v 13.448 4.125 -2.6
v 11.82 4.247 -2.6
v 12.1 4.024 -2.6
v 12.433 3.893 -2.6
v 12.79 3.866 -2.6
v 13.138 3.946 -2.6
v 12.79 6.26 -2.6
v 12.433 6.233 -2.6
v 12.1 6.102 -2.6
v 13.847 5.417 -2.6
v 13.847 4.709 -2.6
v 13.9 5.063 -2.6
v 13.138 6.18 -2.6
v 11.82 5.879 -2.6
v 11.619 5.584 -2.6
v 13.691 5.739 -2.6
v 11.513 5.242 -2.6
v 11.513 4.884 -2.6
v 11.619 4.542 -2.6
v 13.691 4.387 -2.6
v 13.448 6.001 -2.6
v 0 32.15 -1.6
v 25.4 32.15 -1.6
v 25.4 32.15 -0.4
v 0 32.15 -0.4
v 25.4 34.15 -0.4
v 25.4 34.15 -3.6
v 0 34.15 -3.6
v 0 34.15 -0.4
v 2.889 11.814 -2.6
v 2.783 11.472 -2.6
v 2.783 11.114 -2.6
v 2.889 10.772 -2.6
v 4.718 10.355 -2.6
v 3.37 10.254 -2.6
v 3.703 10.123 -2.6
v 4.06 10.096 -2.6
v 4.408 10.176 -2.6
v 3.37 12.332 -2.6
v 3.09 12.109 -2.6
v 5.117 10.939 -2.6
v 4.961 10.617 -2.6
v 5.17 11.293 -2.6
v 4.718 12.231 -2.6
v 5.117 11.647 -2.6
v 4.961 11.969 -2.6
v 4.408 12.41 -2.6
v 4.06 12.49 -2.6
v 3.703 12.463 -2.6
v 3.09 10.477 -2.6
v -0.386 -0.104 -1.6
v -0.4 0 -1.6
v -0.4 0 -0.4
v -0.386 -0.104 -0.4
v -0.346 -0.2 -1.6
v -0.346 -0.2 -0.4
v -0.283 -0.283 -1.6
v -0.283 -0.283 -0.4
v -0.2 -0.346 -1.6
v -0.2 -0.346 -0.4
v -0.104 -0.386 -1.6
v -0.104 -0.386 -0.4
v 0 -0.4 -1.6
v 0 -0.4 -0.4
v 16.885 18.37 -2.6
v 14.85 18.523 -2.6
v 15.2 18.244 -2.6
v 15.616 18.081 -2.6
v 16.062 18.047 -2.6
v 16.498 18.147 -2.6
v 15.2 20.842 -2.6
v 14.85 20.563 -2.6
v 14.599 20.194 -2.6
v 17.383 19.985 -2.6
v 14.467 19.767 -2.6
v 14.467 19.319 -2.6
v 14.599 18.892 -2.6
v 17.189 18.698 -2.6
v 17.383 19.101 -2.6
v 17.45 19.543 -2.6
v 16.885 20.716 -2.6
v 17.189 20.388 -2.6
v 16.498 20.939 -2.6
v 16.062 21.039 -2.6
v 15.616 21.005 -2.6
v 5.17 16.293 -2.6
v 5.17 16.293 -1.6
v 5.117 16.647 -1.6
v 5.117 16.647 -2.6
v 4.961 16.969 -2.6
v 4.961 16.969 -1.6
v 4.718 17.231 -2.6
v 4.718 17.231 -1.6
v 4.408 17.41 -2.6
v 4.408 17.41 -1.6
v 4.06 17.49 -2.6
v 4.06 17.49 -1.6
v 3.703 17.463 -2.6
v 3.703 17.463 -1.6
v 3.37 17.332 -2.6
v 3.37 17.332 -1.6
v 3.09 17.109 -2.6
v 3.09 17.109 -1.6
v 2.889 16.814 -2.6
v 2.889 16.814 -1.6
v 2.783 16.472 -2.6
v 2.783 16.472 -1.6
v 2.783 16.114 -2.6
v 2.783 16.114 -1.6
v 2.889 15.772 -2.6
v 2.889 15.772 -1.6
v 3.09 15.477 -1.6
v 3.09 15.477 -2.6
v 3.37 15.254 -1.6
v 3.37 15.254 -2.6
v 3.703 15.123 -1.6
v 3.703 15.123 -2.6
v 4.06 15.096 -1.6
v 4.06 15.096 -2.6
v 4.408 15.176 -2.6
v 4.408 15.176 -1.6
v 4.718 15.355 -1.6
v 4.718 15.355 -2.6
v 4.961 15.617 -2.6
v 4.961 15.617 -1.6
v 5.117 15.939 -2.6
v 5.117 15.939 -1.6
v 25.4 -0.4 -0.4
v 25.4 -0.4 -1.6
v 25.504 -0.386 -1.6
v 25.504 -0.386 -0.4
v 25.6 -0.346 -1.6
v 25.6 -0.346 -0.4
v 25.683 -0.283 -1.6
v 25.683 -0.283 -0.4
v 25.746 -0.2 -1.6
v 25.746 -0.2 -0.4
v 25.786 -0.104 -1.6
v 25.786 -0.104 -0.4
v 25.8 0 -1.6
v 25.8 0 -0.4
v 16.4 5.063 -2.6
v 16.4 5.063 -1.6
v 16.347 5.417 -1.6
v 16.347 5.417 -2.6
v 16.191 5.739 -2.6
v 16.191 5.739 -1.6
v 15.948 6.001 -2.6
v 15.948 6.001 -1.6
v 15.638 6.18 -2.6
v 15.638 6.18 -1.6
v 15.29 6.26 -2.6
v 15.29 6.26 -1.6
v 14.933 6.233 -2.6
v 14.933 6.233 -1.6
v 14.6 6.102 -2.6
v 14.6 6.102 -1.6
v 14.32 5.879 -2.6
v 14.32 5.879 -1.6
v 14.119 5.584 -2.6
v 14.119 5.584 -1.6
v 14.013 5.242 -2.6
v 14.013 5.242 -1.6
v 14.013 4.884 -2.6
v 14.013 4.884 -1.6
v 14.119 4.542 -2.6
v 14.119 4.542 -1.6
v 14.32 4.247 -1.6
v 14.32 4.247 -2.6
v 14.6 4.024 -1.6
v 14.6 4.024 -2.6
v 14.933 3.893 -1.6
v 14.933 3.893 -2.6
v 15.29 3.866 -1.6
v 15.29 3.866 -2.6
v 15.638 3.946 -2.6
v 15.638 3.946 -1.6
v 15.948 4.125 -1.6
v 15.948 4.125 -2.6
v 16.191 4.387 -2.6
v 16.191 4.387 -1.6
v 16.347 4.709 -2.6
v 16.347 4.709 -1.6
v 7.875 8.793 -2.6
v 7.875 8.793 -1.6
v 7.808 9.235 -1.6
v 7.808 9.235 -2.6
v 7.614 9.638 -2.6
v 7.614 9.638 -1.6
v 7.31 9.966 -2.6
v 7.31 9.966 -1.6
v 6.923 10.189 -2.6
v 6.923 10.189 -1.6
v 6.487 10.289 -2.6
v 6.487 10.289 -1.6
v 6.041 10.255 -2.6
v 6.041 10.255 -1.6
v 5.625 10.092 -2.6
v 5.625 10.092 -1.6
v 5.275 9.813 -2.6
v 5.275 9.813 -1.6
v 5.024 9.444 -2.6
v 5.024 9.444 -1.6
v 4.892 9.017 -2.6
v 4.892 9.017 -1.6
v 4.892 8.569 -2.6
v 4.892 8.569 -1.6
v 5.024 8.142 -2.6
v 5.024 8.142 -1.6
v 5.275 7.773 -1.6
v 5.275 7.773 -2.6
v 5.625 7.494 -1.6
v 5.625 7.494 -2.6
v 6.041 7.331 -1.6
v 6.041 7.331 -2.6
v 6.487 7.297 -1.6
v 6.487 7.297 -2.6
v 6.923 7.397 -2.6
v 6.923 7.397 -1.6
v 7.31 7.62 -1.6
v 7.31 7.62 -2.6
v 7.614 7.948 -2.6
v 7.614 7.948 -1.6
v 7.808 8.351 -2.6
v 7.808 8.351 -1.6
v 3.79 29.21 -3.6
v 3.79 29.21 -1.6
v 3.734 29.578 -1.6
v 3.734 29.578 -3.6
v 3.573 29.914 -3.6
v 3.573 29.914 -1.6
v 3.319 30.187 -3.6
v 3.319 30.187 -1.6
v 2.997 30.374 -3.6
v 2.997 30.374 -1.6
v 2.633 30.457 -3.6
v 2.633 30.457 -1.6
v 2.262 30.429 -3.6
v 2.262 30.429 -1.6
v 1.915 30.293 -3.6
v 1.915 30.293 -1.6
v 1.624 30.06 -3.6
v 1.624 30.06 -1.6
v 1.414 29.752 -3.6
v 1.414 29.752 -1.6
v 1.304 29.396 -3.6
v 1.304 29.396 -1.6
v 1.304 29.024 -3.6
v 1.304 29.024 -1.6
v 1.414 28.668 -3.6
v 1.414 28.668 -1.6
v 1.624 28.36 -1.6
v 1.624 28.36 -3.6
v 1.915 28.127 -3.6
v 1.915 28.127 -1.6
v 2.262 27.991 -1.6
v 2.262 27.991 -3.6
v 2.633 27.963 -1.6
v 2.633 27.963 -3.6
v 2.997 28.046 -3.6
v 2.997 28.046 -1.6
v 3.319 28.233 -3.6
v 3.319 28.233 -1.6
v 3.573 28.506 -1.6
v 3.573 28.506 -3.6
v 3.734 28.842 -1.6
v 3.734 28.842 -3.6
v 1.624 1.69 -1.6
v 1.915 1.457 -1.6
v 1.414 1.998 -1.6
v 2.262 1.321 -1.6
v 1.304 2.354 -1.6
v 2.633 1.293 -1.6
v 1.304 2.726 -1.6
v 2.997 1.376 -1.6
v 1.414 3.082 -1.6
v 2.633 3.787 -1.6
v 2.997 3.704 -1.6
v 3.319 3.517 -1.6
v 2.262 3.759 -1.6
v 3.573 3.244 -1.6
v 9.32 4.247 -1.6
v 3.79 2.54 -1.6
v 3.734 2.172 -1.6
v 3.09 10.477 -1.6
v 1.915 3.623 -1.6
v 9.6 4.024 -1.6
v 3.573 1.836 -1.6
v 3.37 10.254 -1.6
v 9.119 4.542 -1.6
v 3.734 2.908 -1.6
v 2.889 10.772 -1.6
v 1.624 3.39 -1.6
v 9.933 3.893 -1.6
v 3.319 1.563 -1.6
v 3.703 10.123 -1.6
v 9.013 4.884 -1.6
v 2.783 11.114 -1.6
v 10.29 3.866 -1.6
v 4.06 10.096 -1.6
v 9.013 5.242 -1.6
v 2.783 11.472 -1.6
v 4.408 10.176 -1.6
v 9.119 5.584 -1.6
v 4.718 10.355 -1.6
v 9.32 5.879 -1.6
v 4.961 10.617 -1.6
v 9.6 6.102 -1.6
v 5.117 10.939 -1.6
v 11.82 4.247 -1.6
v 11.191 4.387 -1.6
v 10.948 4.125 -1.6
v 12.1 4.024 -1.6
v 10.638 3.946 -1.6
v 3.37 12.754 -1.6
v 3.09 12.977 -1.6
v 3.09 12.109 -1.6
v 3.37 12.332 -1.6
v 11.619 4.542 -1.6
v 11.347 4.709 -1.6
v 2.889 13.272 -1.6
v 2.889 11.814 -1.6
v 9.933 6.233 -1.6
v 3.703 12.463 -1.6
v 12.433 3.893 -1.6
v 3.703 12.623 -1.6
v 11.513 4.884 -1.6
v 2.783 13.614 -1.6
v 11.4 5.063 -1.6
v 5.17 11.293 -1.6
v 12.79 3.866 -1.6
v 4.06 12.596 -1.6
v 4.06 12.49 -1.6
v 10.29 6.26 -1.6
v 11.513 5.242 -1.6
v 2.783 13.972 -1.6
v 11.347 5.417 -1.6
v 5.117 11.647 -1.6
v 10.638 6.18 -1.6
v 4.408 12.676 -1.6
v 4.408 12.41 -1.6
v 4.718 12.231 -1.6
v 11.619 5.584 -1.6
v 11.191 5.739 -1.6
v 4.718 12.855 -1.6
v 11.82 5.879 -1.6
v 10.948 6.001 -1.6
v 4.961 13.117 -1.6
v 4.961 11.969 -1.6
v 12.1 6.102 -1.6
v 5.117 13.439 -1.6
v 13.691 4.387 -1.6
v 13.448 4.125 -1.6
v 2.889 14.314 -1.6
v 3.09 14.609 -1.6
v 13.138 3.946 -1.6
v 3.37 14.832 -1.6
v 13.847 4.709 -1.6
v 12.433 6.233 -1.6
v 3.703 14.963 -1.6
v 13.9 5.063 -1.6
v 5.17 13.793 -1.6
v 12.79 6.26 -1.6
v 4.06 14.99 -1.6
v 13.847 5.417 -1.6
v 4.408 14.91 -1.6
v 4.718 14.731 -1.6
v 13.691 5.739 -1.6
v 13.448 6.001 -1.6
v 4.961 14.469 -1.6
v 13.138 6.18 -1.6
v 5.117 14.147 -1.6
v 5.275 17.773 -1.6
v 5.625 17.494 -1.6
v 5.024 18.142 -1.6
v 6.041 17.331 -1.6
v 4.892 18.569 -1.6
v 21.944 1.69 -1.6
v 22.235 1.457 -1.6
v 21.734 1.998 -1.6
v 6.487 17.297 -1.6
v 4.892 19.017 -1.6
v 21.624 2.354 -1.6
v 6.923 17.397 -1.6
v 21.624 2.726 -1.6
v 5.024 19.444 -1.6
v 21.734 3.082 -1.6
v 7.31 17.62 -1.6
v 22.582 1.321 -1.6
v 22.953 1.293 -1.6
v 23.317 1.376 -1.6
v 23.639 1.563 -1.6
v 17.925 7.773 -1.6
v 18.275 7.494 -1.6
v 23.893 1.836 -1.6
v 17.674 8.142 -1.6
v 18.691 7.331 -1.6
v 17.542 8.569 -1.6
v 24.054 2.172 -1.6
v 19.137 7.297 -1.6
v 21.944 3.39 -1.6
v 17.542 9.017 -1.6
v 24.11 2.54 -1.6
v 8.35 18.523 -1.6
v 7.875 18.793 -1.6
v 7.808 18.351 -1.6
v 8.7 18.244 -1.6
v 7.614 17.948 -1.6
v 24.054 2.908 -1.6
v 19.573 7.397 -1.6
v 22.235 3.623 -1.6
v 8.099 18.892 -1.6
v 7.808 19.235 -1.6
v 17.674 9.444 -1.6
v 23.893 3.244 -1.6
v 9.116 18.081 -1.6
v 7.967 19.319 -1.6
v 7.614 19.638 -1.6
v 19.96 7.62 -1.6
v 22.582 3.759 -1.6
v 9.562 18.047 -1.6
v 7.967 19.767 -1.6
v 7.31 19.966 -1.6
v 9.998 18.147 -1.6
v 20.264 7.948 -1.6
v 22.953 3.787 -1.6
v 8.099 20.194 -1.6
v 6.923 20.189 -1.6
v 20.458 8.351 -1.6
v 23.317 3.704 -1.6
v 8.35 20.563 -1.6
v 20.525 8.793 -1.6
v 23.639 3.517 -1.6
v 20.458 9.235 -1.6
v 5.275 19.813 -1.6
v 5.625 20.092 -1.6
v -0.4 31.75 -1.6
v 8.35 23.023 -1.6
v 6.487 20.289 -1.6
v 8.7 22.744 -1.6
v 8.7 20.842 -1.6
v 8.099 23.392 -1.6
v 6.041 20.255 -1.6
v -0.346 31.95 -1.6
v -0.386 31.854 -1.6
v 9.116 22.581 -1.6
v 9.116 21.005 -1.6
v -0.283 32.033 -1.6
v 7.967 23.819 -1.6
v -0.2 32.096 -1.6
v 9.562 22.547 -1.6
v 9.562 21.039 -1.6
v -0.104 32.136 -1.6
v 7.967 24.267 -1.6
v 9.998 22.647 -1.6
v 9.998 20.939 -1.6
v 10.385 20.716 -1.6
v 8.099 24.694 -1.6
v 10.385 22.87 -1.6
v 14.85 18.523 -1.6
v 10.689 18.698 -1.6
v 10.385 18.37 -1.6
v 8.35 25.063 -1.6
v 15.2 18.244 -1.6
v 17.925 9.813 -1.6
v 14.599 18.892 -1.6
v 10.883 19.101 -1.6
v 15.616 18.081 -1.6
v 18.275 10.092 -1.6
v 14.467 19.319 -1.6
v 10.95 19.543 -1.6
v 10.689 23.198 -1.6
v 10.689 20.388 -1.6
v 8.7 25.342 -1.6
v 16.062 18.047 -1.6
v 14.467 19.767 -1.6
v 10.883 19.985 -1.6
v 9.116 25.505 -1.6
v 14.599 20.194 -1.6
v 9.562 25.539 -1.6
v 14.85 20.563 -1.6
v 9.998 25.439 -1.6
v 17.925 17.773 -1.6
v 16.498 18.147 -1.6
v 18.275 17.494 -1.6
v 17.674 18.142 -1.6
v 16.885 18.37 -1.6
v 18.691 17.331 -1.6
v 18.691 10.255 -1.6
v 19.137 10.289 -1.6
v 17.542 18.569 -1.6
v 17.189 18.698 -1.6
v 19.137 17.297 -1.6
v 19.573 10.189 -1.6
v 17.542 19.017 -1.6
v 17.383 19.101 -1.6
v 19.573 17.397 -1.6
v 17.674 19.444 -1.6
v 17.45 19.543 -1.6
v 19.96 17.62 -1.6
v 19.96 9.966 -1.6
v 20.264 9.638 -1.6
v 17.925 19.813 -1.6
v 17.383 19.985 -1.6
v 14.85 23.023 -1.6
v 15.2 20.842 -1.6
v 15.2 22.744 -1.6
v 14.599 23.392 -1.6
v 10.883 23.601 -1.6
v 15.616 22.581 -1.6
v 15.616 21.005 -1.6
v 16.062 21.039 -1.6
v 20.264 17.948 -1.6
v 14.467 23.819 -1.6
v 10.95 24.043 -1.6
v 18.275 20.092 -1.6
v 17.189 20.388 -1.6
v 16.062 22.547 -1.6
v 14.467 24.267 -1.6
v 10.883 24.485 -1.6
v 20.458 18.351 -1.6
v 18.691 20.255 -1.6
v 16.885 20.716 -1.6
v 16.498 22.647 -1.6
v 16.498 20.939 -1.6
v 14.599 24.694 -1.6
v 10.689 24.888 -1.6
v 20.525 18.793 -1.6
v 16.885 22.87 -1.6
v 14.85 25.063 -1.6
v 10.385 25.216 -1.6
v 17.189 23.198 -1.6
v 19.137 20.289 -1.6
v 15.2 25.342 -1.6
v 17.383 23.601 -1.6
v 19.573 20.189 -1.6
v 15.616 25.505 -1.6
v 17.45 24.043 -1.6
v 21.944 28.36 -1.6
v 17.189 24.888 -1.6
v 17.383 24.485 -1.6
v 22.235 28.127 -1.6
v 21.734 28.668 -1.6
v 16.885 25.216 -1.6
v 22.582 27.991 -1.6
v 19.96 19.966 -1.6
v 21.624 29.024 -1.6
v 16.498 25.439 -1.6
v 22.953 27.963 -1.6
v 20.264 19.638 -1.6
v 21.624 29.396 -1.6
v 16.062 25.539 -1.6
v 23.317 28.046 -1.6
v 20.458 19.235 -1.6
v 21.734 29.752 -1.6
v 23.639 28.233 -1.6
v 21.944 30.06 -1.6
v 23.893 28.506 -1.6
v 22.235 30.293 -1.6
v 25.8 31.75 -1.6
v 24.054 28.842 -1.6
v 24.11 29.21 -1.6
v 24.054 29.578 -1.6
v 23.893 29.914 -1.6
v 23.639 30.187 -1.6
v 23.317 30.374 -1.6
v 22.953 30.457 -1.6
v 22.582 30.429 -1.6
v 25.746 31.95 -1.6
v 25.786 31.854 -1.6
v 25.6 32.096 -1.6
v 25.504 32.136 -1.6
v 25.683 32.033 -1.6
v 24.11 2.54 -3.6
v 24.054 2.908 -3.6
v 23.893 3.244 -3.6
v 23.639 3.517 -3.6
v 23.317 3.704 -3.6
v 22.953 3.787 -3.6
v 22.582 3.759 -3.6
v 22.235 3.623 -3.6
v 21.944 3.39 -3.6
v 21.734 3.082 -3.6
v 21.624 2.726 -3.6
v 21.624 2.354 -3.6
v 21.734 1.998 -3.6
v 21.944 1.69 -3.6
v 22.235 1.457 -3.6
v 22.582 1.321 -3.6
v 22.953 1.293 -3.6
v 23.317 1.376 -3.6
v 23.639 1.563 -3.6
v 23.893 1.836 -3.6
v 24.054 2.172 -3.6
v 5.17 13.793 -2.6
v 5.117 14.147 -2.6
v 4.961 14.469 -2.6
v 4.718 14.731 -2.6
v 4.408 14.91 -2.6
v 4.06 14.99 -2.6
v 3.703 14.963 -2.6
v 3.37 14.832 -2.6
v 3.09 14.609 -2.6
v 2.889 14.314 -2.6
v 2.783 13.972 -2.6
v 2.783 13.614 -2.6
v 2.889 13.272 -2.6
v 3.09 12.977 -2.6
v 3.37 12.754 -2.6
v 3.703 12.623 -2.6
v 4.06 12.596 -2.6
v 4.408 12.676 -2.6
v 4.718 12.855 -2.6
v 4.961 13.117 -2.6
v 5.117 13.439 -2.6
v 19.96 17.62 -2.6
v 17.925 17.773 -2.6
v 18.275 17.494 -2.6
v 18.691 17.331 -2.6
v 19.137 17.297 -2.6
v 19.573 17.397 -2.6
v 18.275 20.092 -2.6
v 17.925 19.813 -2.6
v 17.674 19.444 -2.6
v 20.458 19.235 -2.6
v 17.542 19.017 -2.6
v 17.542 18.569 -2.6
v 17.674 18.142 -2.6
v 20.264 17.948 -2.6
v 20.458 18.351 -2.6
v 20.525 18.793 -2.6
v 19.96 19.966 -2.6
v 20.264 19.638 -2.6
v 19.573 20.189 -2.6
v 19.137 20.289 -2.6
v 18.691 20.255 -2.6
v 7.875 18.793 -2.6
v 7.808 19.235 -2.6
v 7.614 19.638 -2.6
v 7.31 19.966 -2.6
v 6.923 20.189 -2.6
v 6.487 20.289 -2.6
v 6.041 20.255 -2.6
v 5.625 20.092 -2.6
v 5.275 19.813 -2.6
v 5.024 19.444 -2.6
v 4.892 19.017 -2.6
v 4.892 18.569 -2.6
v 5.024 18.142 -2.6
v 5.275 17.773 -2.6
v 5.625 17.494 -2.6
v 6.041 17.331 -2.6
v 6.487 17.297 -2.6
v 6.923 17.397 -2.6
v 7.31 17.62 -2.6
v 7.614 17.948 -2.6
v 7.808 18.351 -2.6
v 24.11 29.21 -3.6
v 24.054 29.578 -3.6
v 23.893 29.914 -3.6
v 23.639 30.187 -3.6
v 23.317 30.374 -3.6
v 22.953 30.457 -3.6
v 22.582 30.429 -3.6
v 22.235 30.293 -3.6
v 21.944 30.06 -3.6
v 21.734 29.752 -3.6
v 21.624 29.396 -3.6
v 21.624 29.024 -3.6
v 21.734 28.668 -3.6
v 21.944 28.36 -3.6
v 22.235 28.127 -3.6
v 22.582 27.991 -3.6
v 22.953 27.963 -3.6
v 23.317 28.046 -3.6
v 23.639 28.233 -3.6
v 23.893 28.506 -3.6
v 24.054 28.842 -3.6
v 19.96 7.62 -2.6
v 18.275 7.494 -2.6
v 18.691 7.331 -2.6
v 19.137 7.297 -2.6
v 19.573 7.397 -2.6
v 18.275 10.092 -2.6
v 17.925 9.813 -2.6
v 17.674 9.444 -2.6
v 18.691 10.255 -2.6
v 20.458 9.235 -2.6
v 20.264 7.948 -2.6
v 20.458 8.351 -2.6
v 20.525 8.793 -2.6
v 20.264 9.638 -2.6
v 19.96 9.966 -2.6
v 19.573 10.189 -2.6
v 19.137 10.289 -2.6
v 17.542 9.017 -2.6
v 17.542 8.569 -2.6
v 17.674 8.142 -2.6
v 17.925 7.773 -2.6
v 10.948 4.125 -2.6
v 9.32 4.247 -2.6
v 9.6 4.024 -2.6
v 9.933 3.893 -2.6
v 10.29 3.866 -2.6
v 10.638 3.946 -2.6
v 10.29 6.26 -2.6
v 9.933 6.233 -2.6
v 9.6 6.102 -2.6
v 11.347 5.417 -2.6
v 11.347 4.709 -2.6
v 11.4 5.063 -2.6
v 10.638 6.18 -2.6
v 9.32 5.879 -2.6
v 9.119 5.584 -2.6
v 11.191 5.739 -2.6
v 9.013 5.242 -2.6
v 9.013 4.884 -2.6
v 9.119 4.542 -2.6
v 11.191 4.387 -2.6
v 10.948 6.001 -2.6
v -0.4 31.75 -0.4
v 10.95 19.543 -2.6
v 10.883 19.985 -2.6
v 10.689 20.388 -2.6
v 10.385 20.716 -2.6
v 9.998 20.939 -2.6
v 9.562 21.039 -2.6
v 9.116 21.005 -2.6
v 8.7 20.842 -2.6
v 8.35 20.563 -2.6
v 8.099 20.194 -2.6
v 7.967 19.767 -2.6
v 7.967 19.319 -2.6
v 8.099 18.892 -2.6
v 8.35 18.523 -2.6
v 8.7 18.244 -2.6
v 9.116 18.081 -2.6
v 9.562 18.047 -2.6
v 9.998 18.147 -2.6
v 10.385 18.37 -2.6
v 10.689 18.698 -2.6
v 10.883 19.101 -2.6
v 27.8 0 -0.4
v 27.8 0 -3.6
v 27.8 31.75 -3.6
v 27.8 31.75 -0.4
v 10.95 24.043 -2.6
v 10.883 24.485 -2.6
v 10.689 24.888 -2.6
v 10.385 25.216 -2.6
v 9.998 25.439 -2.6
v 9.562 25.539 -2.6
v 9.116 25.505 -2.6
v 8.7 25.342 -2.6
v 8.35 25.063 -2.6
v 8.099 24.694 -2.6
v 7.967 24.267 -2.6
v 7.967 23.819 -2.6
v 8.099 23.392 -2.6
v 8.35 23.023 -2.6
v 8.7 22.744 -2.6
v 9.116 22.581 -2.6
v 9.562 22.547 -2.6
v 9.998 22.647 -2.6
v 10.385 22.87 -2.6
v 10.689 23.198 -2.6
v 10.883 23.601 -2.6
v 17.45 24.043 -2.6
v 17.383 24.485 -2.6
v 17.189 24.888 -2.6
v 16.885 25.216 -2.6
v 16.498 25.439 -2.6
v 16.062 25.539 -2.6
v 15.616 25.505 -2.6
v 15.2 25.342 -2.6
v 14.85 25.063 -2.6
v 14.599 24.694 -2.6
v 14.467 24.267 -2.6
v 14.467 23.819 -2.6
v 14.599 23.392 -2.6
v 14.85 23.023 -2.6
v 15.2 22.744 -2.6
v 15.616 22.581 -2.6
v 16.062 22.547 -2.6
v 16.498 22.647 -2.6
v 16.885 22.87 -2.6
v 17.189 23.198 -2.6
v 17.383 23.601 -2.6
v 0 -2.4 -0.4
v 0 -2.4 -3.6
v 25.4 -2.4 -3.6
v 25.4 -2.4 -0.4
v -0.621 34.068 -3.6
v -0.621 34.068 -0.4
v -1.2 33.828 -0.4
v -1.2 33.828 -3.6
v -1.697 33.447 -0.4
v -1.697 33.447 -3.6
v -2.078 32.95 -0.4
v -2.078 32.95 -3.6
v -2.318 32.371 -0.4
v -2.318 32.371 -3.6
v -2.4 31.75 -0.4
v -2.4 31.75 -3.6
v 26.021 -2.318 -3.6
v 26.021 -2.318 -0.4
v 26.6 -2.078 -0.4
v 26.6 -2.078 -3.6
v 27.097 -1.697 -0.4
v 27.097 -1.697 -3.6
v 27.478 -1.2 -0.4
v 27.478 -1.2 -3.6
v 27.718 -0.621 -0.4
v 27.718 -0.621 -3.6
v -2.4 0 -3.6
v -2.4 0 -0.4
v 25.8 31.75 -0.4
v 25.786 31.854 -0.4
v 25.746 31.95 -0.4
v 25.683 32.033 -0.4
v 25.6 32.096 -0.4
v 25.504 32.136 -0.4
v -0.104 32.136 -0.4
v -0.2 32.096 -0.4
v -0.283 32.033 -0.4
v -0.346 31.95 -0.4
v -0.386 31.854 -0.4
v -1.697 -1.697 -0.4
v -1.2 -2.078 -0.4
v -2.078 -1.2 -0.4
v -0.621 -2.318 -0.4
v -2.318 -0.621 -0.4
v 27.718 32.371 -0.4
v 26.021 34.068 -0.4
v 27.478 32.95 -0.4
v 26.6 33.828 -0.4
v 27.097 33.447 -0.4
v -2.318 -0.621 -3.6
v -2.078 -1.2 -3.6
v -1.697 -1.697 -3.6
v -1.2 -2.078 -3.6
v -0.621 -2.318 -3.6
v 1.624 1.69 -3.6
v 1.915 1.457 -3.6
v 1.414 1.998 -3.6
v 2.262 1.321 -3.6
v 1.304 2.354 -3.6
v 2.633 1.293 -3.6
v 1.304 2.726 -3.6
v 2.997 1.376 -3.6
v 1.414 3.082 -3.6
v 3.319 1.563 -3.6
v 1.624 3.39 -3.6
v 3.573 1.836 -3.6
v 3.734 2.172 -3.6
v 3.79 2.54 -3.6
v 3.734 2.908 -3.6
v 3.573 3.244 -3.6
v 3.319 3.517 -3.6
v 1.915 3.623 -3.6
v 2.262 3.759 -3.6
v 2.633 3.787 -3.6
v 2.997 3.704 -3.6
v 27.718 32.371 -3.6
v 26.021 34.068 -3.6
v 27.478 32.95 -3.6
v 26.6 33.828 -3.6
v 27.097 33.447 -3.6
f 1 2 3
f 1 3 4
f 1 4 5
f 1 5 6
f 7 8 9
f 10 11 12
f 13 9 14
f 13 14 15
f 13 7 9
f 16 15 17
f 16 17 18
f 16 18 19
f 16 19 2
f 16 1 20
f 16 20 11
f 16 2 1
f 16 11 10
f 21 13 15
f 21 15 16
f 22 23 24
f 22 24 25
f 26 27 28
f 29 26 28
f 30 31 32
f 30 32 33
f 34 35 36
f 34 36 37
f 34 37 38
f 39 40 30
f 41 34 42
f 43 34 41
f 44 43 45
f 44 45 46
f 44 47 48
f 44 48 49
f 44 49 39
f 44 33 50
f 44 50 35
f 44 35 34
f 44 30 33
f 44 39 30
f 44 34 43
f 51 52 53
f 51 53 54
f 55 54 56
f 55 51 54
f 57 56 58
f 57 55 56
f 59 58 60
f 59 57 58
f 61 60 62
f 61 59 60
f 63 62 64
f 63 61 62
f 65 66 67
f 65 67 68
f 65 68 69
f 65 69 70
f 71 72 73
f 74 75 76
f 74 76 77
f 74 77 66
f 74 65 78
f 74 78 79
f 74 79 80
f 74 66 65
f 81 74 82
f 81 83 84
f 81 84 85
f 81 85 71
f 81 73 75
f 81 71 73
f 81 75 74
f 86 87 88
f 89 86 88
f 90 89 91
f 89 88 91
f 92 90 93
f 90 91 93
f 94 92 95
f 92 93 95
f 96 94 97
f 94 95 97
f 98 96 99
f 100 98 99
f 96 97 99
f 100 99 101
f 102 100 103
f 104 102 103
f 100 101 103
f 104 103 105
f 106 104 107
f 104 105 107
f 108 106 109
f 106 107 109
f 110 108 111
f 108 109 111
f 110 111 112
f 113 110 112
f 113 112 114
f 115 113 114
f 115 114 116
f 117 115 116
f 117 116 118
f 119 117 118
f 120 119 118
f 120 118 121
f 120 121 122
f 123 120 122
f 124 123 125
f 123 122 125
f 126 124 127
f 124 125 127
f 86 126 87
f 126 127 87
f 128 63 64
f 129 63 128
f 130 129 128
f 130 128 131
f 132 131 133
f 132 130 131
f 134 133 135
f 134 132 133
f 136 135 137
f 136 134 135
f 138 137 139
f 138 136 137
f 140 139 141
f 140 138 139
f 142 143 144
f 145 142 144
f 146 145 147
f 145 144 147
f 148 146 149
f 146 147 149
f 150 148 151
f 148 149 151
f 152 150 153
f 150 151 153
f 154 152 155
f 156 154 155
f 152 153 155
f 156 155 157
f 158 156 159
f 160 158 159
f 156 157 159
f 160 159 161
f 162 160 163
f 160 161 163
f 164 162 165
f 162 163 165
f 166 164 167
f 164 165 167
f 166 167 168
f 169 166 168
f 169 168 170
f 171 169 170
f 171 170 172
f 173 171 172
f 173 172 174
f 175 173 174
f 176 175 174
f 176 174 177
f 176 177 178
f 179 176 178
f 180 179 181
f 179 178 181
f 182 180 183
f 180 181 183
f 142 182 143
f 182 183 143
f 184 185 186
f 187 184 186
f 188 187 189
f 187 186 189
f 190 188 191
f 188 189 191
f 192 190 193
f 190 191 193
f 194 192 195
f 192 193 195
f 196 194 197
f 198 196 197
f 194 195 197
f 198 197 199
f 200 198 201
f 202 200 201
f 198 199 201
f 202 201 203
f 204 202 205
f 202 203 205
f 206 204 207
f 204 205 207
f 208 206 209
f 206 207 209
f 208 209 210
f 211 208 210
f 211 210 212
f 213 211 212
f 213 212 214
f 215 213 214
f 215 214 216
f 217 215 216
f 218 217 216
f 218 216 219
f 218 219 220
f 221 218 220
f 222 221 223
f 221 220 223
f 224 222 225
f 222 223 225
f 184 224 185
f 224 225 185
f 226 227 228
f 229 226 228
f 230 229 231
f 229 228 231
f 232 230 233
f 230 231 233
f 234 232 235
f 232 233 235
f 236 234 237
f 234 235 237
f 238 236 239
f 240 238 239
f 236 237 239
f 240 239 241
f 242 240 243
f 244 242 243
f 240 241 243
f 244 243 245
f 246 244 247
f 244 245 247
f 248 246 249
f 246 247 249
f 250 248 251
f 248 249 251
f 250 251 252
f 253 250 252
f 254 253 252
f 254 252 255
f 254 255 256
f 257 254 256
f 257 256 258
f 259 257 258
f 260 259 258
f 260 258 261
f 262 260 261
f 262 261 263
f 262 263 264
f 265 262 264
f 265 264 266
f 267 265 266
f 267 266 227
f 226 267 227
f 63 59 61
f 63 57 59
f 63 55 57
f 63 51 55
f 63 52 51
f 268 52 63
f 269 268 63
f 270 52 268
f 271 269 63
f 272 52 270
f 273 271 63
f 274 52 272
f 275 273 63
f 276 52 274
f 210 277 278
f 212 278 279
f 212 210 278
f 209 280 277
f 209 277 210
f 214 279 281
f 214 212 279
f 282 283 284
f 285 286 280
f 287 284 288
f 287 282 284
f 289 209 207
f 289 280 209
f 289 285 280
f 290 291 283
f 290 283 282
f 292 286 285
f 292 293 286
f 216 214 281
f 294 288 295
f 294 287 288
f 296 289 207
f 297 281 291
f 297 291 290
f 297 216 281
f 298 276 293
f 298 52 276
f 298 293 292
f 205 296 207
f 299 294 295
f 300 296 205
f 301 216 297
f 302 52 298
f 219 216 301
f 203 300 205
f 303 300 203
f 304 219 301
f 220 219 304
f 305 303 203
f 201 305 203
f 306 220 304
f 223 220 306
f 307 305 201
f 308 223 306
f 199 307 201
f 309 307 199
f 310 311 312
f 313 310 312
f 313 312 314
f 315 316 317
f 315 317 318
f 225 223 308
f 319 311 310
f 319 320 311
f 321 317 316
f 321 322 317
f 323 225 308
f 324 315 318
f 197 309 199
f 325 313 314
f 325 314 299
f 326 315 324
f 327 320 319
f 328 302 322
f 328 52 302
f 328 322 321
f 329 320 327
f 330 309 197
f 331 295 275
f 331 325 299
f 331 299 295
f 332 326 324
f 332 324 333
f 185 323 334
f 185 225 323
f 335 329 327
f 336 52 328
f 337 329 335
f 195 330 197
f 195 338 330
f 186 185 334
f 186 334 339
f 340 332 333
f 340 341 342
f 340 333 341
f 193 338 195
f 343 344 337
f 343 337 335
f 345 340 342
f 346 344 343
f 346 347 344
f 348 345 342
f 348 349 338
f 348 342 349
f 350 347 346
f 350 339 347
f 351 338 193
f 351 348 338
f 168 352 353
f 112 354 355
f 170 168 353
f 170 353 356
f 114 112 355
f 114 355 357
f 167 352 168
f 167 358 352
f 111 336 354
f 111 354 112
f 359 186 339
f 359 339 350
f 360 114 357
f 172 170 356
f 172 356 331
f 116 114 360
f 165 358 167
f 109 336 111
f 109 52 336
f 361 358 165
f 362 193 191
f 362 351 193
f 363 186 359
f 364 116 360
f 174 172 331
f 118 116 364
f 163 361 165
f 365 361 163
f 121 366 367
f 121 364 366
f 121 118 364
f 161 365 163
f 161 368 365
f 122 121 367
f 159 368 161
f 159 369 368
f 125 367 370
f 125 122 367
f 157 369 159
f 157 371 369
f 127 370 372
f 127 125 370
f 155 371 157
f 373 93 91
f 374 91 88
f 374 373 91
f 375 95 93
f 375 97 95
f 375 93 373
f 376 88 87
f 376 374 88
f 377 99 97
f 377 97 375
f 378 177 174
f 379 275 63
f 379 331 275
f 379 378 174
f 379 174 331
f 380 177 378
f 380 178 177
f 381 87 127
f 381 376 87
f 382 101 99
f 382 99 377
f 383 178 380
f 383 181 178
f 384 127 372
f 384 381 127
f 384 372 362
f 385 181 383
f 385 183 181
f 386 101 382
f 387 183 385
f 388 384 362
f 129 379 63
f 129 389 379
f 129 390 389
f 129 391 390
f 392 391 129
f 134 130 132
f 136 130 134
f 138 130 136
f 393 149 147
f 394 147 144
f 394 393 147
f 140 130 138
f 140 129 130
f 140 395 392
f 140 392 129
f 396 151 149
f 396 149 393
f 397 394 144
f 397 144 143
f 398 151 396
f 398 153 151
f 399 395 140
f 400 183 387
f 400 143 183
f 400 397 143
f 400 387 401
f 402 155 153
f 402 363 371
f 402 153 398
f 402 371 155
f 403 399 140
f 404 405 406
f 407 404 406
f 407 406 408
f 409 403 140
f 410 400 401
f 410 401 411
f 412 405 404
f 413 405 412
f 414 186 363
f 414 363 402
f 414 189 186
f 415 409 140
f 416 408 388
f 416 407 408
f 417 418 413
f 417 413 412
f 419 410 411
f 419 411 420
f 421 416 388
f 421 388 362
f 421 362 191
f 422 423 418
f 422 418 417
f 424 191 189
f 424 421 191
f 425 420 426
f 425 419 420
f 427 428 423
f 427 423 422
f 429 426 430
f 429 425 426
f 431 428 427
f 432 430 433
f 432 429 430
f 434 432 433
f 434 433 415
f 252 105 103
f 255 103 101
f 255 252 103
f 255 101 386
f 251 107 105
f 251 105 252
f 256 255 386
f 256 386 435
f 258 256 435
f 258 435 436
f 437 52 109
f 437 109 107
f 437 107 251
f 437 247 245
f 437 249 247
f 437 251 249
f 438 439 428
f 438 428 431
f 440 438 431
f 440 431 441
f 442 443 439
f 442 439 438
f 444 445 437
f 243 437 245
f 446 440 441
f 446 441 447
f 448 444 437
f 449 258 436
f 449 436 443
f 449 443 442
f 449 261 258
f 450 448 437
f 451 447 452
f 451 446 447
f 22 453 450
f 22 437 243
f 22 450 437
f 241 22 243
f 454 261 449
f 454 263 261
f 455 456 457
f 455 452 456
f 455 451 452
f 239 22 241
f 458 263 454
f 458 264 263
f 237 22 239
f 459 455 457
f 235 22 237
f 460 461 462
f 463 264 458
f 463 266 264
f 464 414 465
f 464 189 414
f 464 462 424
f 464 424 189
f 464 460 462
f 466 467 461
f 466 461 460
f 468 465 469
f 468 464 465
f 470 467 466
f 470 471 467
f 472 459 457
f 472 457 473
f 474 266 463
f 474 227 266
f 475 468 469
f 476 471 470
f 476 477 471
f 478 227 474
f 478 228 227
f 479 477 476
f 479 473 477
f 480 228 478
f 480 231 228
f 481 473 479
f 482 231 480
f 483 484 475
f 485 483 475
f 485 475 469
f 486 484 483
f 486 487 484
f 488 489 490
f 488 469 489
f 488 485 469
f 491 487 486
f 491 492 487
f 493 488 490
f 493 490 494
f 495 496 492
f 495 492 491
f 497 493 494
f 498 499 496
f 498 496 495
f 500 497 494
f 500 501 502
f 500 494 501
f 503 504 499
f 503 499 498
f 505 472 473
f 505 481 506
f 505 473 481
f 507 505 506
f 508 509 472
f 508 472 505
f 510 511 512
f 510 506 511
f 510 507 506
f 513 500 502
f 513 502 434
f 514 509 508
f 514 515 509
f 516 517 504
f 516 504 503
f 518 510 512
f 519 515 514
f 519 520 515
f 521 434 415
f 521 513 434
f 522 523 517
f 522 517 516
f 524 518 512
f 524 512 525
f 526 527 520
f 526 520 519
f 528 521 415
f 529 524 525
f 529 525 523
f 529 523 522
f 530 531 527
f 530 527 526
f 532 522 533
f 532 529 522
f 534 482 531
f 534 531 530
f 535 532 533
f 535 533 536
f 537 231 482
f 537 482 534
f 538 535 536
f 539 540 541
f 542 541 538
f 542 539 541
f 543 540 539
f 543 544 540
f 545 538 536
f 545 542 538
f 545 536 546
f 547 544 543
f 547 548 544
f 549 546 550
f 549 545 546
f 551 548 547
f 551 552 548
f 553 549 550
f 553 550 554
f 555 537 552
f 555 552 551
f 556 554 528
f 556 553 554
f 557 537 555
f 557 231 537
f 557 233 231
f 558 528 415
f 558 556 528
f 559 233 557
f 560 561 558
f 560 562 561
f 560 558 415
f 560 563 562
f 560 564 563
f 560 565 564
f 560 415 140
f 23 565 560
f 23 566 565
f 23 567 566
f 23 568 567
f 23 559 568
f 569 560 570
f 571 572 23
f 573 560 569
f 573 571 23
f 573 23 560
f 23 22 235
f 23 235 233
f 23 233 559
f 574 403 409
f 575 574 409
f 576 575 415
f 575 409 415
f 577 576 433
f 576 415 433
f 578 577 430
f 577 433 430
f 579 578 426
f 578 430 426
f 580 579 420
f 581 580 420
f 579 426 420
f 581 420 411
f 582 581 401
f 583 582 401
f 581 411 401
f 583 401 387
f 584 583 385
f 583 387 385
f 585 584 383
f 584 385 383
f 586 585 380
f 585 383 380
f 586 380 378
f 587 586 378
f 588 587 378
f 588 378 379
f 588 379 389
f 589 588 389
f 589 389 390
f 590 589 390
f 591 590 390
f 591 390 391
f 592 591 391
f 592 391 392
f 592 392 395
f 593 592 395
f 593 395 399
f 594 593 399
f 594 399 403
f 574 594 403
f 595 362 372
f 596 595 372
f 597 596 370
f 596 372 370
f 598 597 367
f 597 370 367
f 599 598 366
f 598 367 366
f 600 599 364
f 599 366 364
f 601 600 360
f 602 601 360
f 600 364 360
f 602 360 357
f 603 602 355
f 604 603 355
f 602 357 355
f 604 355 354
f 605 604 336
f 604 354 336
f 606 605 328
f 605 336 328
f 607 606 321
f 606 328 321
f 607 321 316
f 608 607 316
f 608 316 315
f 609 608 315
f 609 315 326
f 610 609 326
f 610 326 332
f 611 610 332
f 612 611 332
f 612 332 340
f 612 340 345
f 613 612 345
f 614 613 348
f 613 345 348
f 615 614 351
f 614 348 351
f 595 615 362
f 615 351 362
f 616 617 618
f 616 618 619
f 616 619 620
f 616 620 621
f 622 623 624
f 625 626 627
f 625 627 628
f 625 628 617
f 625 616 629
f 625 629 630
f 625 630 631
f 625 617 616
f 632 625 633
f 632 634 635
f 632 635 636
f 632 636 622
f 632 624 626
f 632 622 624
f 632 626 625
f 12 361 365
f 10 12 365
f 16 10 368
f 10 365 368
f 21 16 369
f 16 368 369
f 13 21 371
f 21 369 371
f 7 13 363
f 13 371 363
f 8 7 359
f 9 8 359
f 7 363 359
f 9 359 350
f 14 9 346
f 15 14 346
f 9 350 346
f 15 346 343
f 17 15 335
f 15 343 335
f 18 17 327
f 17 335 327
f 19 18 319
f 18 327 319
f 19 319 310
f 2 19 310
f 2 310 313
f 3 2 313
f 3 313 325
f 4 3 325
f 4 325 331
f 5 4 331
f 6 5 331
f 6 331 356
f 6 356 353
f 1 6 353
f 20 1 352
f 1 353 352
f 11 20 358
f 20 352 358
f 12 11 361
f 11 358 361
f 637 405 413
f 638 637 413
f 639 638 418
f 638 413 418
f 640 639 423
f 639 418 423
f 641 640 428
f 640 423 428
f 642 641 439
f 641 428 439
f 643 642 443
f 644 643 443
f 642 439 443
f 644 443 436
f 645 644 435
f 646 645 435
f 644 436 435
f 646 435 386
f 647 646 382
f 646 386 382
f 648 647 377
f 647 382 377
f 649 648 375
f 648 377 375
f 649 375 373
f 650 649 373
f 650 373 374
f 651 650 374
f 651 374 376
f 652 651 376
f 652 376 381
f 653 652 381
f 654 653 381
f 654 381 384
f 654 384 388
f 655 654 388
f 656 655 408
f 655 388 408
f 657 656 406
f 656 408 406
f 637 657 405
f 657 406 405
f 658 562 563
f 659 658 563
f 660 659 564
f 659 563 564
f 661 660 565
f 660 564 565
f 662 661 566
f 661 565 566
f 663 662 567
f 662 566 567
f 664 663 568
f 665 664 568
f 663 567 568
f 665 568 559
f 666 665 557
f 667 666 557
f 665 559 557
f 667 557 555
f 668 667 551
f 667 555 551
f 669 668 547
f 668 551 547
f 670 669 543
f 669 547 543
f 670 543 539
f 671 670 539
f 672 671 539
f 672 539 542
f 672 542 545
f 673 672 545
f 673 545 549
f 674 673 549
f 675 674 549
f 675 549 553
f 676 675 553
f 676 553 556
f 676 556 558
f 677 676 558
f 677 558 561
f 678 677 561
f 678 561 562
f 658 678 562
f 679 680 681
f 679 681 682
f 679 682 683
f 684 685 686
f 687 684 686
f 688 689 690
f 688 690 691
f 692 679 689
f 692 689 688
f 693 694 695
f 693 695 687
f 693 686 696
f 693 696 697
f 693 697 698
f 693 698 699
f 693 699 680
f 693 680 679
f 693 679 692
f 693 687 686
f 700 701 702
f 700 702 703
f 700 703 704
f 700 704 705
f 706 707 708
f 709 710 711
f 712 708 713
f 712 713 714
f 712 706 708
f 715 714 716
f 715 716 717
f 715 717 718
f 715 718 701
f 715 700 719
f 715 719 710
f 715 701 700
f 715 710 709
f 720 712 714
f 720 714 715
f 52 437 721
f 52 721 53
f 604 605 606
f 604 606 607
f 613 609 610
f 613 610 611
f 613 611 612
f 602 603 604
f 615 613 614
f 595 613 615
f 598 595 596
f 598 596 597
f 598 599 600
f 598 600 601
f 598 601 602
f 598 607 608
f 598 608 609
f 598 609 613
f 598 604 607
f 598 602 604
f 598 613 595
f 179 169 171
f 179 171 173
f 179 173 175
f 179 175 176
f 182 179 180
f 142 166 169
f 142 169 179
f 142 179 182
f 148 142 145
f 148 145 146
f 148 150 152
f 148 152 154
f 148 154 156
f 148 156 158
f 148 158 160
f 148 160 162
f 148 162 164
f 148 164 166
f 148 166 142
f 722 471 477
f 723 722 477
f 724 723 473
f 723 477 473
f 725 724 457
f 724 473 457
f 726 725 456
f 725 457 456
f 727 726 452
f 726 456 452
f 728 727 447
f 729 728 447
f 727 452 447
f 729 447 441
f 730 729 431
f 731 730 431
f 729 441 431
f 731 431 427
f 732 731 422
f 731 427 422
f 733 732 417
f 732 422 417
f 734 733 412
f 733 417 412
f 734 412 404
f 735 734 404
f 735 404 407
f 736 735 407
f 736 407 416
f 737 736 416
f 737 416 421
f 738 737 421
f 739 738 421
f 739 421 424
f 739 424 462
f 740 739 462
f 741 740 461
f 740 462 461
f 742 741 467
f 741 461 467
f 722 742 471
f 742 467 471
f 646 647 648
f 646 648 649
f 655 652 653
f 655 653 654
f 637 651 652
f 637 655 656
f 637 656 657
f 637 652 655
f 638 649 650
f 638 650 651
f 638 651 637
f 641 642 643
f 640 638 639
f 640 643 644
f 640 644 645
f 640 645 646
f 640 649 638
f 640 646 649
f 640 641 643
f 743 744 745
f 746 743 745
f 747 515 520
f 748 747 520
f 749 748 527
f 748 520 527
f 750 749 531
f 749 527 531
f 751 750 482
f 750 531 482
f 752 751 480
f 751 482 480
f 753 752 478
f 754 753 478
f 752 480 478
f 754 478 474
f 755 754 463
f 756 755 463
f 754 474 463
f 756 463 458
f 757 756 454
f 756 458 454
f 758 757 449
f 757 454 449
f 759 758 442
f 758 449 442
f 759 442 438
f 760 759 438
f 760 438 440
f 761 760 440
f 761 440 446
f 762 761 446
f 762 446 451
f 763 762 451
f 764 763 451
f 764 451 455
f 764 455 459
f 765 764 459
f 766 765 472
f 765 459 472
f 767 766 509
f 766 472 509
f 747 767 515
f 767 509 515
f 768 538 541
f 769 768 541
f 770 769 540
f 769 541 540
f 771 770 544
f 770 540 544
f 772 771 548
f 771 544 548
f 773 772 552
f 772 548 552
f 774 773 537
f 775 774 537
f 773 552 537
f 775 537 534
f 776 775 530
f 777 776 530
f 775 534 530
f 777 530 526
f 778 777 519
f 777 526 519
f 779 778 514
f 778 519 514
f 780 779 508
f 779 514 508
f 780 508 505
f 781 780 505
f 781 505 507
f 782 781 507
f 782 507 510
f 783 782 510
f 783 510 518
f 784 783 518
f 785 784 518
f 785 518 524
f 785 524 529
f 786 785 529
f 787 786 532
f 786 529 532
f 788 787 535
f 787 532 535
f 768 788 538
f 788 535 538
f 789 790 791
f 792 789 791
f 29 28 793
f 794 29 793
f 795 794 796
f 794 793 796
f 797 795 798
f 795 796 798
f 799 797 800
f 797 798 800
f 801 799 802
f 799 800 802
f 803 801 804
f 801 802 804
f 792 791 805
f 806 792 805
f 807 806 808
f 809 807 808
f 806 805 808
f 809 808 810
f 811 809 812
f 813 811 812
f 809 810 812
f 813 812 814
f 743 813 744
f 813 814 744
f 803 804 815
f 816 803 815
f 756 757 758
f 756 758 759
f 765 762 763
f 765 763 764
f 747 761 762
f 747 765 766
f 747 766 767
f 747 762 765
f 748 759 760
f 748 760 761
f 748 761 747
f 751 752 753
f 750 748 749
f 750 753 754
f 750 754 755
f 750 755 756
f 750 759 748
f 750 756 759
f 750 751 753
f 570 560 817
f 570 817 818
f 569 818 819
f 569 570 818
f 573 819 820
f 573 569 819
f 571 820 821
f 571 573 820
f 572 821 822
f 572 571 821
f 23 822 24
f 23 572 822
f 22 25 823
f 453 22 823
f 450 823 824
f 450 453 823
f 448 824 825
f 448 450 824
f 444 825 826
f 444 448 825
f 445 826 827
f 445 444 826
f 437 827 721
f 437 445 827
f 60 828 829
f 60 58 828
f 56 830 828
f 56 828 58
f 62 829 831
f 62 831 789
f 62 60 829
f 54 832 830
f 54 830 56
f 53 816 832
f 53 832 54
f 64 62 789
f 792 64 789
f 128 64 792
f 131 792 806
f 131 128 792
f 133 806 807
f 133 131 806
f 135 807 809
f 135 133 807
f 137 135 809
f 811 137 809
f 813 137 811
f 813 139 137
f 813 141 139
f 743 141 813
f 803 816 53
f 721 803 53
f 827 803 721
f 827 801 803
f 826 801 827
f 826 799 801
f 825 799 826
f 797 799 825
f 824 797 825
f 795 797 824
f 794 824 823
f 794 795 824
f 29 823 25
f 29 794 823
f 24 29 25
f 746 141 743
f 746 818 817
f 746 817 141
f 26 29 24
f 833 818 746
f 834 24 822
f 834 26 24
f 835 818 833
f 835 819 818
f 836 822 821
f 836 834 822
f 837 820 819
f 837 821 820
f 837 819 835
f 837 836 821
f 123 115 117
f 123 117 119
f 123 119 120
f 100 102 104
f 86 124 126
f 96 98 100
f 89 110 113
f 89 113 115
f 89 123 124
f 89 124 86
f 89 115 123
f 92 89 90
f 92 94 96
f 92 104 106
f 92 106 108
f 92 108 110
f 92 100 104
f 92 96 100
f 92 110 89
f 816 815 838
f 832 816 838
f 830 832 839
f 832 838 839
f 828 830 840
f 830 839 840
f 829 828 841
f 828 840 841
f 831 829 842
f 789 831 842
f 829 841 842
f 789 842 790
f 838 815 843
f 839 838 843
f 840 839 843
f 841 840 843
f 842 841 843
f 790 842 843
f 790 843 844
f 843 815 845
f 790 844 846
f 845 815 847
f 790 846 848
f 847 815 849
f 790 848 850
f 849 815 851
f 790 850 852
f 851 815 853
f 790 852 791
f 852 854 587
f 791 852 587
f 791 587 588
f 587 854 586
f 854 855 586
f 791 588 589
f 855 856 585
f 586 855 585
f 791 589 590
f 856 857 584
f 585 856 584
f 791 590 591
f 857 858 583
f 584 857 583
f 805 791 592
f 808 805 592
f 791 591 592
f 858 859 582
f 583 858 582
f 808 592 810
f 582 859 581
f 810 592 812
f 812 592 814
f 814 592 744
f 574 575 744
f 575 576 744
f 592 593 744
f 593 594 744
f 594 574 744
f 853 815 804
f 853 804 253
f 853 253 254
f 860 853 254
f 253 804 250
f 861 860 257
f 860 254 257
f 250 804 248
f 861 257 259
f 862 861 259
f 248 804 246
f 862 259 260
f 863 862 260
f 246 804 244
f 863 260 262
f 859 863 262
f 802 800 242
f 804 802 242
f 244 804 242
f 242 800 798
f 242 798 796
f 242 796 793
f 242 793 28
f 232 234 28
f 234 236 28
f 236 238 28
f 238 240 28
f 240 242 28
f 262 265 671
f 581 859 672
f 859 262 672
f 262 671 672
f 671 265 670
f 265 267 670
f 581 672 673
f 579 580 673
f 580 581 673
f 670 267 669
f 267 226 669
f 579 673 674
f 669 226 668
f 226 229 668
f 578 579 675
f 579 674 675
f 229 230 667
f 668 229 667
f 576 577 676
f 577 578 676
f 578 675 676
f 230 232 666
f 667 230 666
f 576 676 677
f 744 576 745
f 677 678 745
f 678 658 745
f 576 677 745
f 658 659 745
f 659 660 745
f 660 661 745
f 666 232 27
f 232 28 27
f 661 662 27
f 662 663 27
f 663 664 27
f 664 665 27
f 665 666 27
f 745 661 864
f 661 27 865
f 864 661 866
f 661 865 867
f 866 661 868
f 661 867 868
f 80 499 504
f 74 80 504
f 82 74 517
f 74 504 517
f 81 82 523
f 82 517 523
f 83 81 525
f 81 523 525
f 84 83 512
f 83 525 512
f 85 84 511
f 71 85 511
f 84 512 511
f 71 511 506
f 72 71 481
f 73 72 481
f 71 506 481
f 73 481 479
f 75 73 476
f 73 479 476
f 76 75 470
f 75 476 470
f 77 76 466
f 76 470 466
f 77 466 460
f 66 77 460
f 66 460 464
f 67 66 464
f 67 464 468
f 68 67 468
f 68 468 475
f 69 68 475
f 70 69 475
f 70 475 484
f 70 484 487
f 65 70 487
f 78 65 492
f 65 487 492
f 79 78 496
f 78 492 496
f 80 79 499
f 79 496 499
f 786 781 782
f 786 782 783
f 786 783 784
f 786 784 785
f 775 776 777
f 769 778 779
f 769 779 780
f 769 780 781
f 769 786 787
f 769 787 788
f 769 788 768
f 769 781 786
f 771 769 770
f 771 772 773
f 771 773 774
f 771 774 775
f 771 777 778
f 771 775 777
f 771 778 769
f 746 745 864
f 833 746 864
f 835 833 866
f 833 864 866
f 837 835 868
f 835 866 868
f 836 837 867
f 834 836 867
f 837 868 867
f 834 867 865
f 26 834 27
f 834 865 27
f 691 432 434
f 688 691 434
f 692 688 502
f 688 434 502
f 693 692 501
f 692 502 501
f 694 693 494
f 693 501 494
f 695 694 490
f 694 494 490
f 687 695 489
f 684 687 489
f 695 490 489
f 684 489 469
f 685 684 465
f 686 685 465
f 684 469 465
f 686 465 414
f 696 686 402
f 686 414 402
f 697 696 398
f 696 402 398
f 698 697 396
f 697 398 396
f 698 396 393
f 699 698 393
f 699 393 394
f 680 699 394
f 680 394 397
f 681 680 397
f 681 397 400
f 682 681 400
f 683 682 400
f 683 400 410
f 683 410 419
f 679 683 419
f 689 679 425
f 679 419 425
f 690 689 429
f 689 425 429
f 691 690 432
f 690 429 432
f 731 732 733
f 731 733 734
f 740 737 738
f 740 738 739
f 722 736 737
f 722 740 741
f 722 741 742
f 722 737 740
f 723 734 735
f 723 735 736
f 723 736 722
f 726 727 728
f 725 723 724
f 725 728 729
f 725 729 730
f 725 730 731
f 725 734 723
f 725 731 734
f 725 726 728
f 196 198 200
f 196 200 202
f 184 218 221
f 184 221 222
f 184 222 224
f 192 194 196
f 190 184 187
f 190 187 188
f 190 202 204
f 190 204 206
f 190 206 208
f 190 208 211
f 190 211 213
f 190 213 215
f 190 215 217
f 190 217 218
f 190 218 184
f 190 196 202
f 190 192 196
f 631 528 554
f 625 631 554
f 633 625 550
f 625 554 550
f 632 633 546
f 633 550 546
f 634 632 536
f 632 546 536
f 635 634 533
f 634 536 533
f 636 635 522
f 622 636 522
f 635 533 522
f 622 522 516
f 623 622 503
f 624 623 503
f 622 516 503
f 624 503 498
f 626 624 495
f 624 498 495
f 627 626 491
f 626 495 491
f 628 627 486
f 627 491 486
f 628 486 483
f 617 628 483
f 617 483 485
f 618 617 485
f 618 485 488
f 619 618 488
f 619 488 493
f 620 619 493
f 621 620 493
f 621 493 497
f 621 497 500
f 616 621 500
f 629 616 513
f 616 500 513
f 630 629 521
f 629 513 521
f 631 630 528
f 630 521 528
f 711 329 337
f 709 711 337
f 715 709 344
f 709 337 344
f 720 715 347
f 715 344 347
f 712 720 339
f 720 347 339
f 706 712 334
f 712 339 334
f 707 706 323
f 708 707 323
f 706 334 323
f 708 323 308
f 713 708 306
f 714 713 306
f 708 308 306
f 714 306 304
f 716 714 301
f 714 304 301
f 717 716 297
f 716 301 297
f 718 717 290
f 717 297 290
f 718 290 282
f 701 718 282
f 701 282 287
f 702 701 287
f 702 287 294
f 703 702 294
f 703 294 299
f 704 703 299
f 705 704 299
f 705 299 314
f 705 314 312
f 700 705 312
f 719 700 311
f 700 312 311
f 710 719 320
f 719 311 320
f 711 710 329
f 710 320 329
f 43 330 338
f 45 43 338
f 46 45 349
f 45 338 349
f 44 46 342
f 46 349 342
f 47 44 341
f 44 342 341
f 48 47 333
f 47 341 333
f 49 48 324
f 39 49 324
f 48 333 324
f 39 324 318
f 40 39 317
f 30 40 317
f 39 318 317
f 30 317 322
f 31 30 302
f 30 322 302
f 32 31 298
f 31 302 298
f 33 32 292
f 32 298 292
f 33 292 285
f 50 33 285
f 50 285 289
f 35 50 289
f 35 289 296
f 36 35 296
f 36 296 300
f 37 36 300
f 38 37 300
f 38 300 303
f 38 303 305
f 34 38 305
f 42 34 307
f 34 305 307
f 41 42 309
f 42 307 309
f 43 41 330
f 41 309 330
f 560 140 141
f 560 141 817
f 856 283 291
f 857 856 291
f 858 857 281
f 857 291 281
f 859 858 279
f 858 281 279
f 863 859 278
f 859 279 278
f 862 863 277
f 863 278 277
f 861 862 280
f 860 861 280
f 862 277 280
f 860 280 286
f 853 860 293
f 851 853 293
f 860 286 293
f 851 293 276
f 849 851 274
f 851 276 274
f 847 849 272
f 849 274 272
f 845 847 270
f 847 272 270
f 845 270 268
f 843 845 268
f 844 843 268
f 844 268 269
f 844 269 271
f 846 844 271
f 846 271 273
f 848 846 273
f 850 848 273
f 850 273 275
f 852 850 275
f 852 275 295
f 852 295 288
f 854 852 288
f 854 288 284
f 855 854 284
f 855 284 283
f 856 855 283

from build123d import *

# Parameters (mm, degrees)
PAD_DEPTH       = 3.2
THICKNESS001_T  = -2
SKETCH010_R     = 1.25
POCKET002_DEPTH = 2.001
SKETCH011_R     = 1.5
SKETCH011_R_2   = 1.2
POCKET003_DEPTH = 1


with BuildPart() as part:
    # Sketch009 → Pad (new body)
    with BuildSketch(Plane.XY):
        with BuildLine():
            Line((-2.4, 31.749999), (-2.4, 0))
            ThreePointArc((-2.4, 0), (-1.697056, -1.697056), (0, -2.4))
            Line((0, -2.4), (25.4, -2.4))
            ThreePointArc((25.4, -2.4), (27.097056, -1.697057), (27.8, -1e-06))
            Line((27.8, -1e-06), (27.8, 31.75))
            ThreePointArc((27.8, 31.75), (27.097057, 33.447056), (25.400001, 34.15))
            Line((25.400001, 34.15), (1e-06, 34.15))
            ThreePointArc((1e-06, 34.15), (-1.697056, 33.447056), (-2.4, 31.749999))
        make_face()
    extrude(amount=PAD_DEPTH)

    # Thickness001
    thickness001_openings = [part.faces().sort_by_distance(p)[0] for p in [
        (12.7, 15.875, 3.2),
    ]]
    offset(amount=THICKNESS001_T, openings=thickness001_openings)

    # Sketch010 (on Face19 of Thickness001) → Pocket002 (cut, through all)
    with BuildSketch(Plane.XY.offset(2)):
        with Locations((2.54, 29.21)):
            Circle(SKETCH010_R)
        with Locations((22.86, 29.21)):
            Circle(SKETCH010_R)
        with Locations((22.86, 2.54)):
            Circle(SKETCH010_R)
        with Locations((2.54, 2.54)):
            Circle(SKETCH010_R)
    extrude(amount=-POCKET002_DEPTH, mode=Mode.SUBTRACT)

    # Sketch011 (on Face23 of Pocket002) → Pocket003 (cut)
    with BuildSketch(Plane.XY.offset(2)):
        with Locations((9.45, 24.043)):
            Circle(SKETCH011_R)
        with Locations((15.95, 24.043)):
            Circle(SKETCH011_R)
        with Locations((15.95, 19.543)):
            Circle(SKETCH011_R)
        with Locations((19.025, 18.793)):
            Circle(SKETCH011_R)
        with Locations((19.025, 8.793)):
            Circle(SKETCH011_R)
        with Locations((9.45, 19.543)):
            Circle(SKETCH011_R)
        with Locations((6.375, 18.793)):
            Circle(SKETCH011_R)
        with Locations((6.375, 8.793)):
            Circle(SKETCH011_R)
        with Locations((3.97, 16.293)):
            Circle(SKETCH011_R_2)
        with Locations((3.97, 13.793)):
            Circle(SKETCH011_R_2)
        with Locations((3.97, 11.293)):
            Circle(SKETCH011_R_2)
        with Locations((10.2, 5.063)):
            Circle(SKETCH011_R_2)
        with Locations((12.7, 5.063)):
            Circle(SKETCH011_R_2)
        with Locations((15.2, 5.063)):
            Circle(SKETCH011_R_2)
    extrude(amount=-POCKET003_DEPTH, mode=Mode.SUBTRACT)


with BuildPart() as part_1:
    # Body placement: moved
    add(part.part.moved(Location((0, 0, -3.6))))


solid = part_1.part
